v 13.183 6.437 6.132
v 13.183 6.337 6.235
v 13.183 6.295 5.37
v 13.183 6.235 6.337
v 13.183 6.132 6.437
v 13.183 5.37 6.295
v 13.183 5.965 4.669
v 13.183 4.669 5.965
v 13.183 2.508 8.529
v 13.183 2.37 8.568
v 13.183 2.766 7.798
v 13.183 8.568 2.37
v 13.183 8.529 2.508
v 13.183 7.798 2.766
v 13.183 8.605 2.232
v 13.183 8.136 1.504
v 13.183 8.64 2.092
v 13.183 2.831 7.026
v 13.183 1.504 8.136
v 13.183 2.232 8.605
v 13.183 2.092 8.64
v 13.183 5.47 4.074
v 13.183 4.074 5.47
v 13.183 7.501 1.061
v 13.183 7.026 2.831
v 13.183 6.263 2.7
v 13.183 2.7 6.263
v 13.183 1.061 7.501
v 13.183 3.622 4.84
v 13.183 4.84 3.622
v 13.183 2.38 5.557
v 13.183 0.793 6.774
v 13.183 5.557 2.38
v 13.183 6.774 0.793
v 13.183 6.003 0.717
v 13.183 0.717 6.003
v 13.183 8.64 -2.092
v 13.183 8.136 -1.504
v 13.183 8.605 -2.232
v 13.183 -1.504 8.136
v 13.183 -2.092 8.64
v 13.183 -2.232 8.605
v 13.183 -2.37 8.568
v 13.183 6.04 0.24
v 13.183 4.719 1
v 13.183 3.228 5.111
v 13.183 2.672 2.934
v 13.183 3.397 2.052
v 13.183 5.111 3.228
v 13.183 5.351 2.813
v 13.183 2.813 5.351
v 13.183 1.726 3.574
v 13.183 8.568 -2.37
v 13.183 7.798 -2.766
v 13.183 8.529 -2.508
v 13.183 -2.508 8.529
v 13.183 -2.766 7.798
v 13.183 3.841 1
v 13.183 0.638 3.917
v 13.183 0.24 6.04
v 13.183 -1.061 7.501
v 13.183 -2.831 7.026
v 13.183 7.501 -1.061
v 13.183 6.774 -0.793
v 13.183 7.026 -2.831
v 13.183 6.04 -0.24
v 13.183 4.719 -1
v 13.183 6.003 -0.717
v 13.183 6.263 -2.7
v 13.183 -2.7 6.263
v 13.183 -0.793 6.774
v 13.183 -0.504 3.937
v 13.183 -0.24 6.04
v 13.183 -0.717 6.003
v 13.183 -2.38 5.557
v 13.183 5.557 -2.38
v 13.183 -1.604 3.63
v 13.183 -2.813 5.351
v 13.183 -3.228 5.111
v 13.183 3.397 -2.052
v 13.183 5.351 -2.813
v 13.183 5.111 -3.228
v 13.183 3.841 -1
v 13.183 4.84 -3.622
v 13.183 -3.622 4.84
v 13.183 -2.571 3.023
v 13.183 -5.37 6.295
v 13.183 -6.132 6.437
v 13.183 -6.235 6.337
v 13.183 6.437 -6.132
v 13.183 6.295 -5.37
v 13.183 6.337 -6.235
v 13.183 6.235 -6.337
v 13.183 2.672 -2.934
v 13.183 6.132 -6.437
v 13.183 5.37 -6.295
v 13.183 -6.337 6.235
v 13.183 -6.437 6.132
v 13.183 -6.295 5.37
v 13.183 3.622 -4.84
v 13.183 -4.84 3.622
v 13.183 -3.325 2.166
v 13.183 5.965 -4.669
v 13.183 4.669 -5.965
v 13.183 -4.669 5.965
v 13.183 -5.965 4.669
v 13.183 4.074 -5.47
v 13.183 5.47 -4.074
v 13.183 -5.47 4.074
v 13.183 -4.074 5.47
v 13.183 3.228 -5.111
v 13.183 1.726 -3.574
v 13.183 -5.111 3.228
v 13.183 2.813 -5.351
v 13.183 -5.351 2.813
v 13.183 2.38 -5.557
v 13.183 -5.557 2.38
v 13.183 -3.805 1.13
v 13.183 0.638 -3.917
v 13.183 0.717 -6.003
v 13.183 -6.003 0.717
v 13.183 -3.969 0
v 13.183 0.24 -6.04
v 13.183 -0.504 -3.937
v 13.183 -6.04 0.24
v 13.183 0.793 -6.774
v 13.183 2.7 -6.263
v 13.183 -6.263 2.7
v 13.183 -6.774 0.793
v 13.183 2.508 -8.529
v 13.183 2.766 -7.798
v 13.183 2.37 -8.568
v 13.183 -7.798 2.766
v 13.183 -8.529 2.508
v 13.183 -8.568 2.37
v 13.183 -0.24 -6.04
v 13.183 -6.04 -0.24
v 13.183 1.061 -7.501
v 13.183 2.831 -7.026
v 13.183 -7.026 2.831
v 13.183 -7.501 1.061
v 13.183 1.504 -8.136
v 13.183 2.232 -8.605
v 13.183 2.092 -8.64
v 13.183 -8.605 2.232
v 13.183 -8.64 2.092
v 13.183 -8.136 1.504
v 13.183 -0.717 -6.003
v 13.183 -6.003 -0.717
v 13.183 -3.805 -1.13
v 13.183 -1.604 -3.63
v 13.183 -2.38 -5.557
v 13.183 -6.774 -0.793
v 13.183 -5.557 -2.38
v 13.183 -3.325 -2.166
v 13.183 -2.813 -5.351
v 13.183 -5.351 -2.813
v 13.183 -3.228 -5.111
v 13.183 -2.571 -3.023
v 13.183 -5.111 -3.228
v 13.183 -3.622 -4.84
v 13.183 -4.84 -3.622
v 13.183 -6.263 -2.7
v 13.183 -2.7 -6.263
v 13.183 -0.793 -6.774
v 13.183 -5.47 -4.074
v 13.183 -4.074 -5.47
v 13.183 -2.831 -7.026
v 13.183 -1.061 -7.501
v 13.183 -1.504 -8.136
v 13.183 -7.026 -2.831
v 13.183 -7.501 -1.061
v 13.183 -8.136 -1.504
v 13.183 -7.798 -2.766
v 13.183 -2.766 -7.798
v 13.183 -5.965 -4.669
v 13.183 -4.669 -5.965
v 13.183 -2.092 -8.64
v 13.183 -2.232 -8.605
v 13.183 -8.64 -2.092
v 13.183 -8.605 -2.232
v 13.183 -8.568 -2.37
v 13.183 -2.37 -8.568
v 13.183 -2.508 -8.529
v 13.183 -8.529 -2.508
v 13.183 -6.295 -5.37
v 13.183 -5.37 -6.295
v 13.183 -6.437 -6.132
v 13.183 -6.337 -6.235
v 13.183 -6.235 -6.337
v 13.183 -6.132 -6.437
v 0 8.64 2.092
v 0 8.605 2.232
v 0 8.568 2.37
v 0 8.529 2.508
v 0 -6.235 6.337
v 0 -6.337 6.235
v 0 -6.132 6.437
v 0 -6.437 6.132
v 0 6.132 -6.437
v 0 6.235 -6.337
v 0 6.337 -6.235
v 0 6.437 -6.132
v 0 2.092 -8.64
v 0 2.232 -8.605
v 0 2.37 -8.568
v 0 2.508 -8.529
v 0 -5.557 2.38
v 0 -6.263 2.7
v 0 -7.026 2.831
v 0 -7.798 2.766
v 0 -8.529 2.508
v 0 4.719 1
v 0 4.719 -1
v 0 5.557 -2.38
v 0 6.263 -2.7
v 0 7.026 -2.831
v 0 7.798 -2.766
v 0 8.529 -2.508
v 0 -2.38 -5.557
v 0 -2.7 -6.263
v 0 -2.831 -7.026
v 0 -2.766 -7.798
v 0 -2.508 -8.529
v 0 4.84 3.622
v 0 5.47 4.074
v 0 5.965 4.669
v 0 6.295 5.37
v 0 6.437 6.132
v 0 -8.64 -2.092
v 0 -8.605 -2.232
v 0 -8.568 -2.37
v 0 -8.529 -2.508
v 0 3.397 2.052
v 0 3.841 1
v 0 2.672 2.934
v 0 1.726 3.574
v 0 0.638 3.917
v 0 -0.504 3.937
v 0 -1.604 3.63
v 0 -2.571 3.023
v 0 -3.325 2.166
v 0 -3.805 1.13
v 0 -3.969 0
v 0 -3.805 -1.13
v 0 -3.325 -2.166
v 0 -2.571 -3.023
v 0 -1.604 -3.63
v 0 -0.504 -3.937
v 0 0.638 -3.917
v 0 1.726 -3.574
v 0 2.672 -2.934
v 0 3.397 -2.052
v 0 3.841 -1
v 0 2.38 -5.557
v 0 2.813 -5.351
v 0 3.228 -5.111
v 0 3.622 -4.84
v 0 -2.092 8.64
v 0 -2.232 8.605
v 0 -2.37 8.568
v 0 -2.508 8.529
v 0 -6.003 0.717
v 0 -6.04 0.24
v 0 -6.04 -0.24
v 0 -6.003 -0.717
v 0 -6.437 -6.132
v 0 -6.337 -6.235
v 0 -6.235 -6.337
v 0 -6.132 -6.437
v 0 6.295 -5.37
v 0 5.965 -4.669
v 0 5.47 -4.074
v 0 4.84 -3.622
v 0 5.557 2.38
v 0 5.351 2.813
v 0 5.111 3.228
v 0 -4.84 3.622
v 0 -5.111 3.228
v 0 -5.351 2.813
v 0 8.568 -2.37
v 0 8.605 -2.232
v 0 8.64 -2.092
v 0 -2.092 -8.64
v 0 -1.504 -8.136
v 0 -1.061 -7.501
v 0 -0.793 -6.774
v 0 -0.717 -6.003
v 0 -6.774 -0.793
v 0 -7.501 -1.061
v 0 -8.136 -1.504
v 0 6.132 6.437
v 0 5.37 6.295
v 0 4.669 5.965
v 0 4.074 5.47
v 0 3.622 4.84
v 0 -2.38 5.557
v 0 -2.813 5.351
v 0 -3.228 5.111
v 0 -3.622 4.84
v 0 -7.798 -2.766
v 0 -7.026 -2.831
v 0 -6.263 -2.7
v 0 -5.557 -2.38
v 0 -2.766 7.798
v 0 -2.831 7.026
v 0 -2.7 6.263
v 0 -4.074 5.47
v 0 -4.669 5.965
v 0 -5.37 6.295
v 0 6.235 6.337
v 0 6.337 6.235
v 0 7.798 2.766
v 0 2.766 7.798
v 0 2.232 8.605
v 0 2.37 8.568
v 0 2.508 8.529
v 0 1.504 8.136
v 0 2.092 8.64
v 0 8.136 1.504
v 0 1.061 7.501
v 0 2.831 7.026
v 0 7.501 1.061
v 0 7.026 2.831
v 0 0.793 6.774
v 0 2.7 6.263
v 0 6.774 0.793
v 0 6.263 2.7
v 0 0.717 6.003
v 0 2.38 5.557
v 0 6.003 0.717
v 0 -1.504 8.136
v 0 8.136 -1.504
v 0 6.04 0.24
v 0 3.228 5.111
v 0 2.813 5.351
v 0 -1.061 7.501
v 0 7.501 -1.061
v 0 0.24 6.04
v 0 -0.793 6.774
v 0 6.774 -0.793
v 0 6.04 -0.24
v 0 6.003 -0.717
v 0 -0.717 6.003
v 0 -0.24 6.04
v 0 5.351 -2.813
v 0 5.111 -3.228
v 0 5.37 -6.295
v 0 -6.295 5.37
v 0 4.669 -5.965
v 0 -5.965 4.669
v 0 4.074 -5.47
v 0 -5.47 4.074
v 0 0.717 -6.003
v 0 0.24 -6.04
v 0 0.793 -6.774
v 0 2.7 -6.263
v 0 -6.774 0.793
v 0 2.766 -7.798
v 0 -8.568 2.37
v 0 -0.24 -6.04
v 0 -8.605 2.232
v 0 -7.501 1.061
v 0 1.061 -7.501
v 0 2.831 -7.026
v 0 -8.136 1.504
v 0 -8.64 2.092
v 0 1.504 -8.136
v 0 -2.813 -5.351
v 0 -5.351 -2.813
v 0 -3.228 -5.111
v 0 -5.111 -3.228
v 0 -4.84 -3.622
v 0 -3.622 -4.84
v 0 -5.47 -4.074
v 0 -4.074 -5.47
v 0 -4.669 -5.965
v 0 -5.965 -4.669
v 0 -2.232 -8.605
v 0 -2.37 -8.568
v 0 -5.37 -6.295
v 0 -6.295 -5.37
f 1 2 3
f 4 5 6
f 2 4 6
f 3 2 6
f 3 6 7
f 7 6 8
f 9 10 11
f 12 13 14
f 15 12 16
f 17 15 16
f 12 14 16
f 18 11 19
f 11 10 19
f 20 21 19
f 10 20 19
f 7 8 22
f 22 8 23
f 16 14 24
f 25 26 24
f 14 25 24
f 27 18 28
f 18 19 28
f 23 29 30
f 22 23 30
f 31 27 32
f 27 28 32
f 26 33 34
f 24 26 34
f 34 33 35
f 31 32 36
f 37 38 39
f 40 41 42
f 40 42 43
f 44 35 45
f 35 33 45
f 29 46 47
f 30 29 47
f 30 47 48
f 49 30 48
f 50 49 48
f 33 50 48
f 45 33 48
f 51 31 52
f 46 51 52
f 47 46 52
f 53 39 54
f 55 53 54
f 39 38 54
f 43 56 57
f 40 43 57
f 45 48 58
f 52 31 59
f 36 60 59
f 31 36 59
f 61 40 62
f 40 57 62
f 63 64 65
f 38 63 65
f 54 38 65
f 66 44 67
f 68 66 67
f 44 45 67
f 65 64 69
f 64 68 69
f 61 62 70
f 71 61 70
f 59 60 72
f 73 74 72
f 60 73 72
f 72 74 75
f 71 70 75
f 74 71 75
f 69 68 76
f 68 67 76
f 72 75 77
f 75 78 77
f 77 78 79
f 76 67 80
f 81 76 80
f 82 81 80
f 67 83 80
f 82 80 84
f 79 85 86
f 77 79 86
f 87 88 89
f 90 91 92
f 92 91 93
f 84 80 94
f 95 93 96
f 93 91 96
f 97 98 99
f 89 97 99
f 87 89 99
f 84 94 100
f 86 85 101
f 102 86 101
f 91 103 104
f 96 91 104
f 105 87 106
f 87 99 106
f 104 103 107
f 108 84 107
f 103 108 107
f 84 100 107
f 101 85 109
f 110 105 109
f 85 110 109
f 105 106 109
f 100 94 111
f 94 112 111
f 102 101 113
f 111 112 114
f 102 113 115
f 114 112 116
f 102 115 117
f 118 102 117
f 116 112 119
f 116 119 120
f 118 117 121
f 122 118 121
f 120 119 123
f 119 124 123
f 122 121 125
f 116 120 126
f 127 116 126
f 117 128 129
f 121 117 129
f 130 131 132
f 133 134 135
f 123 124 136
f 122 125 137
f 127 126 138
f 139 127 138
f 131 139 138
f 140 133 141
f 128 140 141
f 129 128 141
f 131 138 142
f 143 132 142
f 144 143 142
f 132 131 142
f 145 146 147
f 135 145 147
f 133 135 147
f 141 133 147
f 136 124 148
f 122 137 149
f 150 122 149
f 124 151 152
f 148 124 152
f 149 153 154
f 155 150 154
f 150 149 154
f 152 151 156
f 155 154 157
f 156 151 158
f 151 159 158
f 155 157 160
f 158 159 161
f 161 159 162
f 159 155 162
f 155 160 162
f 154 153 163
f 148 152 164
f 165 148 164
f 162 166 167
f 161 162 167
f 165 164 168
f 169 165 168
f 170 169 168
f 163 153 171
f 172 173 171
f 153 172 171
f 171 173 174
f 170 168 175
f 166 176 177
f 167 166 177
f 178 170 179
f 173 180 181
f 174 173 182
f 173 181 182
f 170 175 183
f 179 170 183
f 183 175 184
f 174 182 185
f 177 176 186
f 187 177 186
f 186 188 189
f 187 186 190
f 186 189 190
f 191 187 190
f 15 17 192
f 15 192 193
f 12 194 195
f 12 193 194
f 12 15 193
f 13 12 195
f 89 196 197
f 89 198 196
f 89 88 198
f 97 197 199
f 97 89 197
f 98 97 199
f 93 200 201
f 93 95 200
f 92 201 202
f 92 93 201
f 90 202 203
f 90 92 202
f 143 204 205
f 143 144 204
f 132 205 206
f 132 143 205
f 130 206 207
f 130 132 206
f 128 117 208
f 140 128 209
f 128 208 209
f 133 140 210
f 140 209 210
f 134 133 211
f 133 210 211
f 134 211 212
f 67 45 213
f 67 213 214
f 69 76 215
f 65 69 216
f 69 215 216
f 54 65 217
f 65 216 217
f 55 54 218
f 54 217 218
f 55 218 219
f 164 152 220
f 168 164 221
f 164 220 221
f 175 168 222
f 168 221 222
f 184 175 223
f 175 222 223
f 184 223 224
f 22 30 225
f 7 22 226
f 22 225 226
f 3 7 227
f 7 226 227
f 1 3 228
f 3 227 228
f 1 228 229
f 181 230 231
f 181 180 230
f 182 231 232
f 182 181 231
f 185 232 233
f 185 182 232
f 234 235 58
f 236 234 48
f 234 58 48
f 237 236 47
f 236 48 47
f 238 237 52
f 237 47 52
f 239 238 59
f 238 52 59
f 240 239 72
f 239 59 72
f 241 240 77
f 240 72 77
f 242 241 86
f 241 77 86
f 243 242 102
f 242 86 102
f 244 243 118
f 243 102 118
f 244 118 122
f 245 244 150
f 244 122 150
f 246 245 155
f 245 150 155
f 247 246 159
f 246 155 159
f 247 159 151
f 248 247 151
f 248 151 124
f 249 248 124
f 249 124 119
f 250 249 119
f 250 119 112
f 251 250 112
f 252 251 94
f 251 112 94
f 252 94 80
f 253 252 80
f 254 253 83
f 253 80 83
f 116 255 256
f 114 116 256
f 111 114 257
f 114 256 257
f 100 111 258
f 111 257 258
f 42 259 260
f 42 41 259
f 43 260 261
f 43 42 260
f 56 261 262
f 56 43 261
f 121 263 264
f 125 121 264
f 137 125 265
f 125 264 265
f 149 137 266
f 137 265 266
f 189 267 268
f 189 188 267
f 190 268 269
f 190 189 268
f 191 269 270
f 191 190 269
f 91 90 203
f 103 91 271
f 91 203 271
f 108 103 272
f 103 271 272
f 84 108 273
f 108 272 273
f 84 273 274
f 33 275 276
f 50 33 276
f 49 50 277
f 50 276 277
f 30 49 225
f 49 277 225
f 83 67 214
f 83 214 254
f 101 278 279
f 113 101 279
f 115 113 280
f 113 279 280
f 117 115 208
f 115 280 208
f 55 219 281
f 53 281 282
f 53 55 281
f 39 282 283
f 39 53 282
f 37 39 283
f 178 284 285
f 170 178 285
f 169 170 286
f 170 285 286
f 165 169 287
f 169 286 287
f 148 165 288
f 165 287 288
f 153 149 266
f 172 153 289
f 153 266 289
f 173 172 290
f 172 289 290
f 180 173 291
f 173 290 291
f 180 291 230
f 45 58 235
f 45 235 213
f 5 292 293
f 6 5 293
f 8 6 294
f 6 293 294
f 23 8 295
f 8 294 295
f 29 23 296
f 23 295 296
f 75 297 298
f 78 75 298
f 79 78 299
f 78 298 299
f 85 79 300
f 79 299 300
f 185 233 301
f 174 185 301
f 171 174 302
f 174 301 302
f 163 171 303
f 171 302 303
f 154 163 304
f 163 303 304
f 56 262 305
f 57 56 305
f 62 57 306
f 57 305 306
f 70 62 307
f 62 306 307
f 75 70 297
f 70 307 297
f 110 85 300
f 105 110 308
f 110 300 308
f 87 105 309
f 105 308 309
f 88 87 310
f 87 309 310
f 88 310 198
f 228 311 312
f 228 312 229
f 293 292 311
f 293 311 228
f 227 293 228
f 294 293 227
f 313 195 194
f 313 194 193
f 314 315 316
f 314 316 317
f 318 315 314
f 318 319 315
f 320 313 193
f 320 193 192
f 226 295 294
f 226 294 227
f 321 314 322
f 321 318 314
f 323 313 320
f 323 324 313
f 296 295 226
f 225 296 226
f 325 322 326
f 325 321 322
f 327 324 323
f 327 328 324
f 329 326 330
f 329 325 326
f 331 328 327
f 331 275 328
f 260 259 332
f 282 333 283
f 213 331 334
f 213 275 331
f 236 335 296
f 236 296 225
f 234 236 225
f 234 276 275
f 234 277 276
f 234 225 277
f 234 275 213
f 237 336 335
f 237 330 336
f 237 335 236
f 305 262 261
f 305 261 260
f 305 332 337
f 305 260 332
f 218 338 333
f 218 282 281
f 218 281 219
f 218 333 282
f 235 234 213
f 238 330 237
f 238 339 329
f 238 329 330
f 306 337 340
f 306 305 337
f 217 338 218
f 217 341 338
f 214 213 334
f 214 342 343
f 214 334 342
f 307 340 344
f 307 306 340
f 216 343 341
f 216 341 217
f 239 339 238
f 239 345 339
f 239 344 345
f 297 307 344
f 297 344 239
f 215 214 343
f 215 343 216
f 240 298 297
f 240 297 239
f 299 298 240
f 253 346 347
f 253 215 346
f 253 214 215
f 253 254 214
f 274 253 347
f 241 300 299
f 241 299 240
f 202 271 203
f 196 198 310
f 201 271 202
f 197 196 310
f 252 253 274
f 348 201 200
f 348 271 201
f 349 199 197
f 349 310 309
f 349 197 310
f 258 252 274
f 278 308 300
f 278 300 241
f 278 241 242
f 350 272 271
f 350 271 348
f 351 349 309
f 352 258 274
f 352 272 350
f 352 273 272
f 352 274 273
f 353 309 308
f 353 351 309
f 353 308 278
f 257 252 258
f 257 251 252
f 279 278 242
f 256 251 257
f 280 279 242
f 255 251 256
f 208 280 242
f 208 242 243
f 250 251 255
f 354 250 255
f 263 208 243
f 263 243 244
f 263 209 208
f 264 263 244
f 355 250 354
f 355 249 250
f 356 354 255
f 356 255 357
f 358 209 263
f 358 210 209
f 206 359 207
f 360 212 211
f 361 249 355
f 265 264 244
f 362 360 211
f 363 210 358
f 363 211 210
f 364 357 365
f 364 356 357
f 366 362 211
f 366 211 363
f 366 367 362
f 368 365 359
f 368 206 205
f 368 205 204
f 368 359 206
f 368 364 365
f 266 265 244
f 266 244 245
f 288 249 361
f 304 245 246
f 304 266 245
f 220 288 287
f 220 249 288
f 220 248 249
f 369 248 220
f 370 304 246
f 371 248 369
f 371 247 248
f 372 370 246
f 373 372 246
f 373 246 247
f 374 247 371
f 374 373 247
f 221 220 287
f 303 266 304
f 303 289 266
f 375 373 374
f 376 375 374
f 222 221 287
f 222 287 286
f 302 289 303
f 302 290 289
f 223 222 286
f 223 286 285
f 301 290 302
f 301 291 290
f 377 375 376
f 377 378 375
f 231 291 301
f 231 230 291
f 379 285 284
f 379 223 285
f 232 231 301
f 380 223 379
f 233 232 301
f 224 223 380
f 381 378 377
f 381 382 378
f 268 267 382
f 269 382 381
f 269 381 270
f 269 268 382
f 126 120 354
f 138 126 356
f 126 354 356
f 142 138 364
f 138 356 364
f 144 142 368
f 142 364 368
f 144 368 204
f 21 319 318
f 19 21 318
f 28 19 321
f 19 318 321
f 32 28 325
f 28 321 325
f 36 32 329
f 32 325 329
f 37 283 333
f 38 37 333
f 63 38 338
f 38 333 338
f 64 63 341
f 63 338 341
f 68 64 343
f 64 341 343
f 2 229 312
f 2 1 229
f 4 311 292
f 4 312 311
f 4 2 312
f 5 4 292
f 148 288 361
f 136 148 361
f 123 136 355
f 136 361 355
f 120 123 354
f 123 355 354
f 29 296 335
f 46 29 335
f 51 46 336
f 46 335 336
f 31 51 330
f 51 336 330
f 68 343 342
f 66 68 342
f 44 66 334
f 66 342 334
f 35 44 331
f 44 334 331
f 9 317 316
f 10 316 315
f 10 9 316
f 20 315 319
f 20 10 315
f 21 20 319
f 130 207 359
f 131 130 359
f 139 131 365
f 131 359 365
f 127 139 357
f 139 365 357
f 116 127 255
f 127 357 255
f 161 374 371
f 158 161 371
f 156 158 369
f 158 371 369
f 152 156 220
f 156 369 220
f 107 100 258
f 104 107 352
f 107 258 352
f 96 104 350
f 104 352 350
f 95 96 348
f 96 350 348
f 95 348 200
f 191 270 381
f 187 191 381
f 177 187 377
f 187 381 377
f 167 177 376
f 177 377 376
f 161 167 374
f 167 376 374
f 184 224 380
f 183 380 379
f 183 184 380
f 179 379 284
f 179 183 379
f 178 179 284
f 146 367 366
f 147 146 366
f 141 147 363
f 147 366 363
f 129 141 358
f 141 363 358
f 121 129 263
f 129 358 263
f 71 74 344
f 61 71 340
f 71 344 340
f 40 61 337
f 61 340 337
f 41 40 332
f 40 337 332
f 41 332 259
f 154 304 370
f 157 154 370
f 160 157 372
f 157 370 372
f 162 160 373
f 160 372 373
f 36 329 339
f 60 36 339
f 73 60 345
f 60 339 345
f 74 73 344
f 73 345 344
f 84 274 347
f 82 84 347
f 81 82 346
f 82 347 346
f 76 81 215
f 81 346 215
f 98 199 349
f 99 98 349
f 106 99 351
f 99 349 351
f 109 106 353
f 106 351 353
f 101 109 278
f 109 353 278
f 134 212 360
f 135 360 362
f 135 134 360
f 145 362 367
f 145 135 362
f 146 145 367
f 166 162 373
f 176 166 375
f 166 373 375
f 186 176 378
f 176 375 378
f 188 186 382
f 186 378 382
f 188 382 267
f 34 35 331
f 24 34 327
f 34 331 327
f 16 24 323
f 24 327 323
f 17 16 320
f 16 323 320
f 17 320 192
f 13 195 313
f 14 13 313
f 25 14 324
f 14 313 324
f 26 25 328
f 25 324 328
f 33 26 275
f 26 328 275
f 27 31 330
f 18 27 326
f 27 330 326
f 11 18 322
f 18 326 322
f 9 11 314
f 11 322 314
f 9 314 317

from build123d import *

# Parameters (mm, degrees)
BASPROSKE_W        = 13.1826
BASPROSKE_H        = 8.89
TOOTHCUT_DEPTH     = 19.216617215
TEETHCUTS_COUNT    = 12
TEETHCUTS_ANGLE    = 330
BORSKE_R           = 3.96875
BORE_DEPTH         = 13.1826508
CUT_EXTRUDE1_DEPTH = 18.974701376


with BuildPart() as part:
    # BasProSke → Base-Revolve (revolve)
    with BuildSketch(Plane(origin=(0, 0, 0), x_dir=(1, 0, 0), z_dir=(0, 1, 0)), mode=Mode.PRIVATE) as base_revolve_sk:
        with Locations((6.5913, 4.445)):
            Rectangle(BASPROSKE_W, BASPROSKE_H)
    revolve(base_revolve_sk.sketch.rotate(Axis((-10, 0, 0), (1, 0, 0)), 180), axis=Axis((-10, 0, 0), (1, 0, 0)))

    # TooCutSke → ToothCut (cut, through all)
    with BuildSketch(Plane(origin=(0, 0, 0), x_dir=(0, 0, -1), z_dir=(1, 0, 0))):
        with BuildLine():
            ThreePointArc((0.717076553, 6.002519826), (0, 6.0452), (-0.717076553, 6.002519826))
            ThreePointArc((-0.717076553, 6.002519826), (-1.069160545, 7.516029346), (-2.121611652, 8.659279483))
            ThreePointArc((-2.121611652, 8.659279483), (0, 8.9154), (2.121611652, 8.659279483))
            ThreePointArc((2.121611652, 8.659279483), (1.069160545, 7.516029346), (0.717076553, 6.002519826))
        make_face()
    toothcut = extrude(amount=TOOTHCUT_DEPTH, mode=Mode.SUBTRACT)

    # TeethCuts: ToothCut ×12 about axis
    teethcuts_axis = Axis((-10, 0, 0), (1, 0, 0))
    for i in range(1, TEETHCUTS_COUNT):
        add(toothcut.rotate(teethcuts_axis, i * TEETHCUTS_ANGLE / (TEETHCUTS_COUNT - 1)), mode=Mode.SUBTRACT)

    # BorSke → Bore (cut, symmetric)
    with BuildSketch(Plane(origin=(0, 0, 0), x_dir=(0, 0, -1), z_dir=(1, 0, 0))):
        with Locations(Location((0, 0, 0), (0, 0, 180))):
            Circle(BORSKE_R)
    extrude(amount=BORE_DEPTH, both=True, mode=Mode.SUBTRACT)

    # Sketch1 → Cut-Extrude1 (cut, through all)
    with BuildSketch(Plane(origin=(13.1826, 0, 0), x_dir=(0, 0, -1), z_dir=(1, 0, 0))):
        with BuildLine():
            Line((-1, 3.840700009), (-1, 4.71875))
            Line((-1, 4.71875), (1, 4.71875))
            Line((1, 4.71875), (1, 3.840700009))
            ThreePointArc((1, 3.840700009), (0, 3.96875), (-1, 3.840700009))
        make_face()
    extrude(amount=-CUT_EXTRUDE1_DEPTH, mode=Mode.SUBTRACT)


solid = part.part
